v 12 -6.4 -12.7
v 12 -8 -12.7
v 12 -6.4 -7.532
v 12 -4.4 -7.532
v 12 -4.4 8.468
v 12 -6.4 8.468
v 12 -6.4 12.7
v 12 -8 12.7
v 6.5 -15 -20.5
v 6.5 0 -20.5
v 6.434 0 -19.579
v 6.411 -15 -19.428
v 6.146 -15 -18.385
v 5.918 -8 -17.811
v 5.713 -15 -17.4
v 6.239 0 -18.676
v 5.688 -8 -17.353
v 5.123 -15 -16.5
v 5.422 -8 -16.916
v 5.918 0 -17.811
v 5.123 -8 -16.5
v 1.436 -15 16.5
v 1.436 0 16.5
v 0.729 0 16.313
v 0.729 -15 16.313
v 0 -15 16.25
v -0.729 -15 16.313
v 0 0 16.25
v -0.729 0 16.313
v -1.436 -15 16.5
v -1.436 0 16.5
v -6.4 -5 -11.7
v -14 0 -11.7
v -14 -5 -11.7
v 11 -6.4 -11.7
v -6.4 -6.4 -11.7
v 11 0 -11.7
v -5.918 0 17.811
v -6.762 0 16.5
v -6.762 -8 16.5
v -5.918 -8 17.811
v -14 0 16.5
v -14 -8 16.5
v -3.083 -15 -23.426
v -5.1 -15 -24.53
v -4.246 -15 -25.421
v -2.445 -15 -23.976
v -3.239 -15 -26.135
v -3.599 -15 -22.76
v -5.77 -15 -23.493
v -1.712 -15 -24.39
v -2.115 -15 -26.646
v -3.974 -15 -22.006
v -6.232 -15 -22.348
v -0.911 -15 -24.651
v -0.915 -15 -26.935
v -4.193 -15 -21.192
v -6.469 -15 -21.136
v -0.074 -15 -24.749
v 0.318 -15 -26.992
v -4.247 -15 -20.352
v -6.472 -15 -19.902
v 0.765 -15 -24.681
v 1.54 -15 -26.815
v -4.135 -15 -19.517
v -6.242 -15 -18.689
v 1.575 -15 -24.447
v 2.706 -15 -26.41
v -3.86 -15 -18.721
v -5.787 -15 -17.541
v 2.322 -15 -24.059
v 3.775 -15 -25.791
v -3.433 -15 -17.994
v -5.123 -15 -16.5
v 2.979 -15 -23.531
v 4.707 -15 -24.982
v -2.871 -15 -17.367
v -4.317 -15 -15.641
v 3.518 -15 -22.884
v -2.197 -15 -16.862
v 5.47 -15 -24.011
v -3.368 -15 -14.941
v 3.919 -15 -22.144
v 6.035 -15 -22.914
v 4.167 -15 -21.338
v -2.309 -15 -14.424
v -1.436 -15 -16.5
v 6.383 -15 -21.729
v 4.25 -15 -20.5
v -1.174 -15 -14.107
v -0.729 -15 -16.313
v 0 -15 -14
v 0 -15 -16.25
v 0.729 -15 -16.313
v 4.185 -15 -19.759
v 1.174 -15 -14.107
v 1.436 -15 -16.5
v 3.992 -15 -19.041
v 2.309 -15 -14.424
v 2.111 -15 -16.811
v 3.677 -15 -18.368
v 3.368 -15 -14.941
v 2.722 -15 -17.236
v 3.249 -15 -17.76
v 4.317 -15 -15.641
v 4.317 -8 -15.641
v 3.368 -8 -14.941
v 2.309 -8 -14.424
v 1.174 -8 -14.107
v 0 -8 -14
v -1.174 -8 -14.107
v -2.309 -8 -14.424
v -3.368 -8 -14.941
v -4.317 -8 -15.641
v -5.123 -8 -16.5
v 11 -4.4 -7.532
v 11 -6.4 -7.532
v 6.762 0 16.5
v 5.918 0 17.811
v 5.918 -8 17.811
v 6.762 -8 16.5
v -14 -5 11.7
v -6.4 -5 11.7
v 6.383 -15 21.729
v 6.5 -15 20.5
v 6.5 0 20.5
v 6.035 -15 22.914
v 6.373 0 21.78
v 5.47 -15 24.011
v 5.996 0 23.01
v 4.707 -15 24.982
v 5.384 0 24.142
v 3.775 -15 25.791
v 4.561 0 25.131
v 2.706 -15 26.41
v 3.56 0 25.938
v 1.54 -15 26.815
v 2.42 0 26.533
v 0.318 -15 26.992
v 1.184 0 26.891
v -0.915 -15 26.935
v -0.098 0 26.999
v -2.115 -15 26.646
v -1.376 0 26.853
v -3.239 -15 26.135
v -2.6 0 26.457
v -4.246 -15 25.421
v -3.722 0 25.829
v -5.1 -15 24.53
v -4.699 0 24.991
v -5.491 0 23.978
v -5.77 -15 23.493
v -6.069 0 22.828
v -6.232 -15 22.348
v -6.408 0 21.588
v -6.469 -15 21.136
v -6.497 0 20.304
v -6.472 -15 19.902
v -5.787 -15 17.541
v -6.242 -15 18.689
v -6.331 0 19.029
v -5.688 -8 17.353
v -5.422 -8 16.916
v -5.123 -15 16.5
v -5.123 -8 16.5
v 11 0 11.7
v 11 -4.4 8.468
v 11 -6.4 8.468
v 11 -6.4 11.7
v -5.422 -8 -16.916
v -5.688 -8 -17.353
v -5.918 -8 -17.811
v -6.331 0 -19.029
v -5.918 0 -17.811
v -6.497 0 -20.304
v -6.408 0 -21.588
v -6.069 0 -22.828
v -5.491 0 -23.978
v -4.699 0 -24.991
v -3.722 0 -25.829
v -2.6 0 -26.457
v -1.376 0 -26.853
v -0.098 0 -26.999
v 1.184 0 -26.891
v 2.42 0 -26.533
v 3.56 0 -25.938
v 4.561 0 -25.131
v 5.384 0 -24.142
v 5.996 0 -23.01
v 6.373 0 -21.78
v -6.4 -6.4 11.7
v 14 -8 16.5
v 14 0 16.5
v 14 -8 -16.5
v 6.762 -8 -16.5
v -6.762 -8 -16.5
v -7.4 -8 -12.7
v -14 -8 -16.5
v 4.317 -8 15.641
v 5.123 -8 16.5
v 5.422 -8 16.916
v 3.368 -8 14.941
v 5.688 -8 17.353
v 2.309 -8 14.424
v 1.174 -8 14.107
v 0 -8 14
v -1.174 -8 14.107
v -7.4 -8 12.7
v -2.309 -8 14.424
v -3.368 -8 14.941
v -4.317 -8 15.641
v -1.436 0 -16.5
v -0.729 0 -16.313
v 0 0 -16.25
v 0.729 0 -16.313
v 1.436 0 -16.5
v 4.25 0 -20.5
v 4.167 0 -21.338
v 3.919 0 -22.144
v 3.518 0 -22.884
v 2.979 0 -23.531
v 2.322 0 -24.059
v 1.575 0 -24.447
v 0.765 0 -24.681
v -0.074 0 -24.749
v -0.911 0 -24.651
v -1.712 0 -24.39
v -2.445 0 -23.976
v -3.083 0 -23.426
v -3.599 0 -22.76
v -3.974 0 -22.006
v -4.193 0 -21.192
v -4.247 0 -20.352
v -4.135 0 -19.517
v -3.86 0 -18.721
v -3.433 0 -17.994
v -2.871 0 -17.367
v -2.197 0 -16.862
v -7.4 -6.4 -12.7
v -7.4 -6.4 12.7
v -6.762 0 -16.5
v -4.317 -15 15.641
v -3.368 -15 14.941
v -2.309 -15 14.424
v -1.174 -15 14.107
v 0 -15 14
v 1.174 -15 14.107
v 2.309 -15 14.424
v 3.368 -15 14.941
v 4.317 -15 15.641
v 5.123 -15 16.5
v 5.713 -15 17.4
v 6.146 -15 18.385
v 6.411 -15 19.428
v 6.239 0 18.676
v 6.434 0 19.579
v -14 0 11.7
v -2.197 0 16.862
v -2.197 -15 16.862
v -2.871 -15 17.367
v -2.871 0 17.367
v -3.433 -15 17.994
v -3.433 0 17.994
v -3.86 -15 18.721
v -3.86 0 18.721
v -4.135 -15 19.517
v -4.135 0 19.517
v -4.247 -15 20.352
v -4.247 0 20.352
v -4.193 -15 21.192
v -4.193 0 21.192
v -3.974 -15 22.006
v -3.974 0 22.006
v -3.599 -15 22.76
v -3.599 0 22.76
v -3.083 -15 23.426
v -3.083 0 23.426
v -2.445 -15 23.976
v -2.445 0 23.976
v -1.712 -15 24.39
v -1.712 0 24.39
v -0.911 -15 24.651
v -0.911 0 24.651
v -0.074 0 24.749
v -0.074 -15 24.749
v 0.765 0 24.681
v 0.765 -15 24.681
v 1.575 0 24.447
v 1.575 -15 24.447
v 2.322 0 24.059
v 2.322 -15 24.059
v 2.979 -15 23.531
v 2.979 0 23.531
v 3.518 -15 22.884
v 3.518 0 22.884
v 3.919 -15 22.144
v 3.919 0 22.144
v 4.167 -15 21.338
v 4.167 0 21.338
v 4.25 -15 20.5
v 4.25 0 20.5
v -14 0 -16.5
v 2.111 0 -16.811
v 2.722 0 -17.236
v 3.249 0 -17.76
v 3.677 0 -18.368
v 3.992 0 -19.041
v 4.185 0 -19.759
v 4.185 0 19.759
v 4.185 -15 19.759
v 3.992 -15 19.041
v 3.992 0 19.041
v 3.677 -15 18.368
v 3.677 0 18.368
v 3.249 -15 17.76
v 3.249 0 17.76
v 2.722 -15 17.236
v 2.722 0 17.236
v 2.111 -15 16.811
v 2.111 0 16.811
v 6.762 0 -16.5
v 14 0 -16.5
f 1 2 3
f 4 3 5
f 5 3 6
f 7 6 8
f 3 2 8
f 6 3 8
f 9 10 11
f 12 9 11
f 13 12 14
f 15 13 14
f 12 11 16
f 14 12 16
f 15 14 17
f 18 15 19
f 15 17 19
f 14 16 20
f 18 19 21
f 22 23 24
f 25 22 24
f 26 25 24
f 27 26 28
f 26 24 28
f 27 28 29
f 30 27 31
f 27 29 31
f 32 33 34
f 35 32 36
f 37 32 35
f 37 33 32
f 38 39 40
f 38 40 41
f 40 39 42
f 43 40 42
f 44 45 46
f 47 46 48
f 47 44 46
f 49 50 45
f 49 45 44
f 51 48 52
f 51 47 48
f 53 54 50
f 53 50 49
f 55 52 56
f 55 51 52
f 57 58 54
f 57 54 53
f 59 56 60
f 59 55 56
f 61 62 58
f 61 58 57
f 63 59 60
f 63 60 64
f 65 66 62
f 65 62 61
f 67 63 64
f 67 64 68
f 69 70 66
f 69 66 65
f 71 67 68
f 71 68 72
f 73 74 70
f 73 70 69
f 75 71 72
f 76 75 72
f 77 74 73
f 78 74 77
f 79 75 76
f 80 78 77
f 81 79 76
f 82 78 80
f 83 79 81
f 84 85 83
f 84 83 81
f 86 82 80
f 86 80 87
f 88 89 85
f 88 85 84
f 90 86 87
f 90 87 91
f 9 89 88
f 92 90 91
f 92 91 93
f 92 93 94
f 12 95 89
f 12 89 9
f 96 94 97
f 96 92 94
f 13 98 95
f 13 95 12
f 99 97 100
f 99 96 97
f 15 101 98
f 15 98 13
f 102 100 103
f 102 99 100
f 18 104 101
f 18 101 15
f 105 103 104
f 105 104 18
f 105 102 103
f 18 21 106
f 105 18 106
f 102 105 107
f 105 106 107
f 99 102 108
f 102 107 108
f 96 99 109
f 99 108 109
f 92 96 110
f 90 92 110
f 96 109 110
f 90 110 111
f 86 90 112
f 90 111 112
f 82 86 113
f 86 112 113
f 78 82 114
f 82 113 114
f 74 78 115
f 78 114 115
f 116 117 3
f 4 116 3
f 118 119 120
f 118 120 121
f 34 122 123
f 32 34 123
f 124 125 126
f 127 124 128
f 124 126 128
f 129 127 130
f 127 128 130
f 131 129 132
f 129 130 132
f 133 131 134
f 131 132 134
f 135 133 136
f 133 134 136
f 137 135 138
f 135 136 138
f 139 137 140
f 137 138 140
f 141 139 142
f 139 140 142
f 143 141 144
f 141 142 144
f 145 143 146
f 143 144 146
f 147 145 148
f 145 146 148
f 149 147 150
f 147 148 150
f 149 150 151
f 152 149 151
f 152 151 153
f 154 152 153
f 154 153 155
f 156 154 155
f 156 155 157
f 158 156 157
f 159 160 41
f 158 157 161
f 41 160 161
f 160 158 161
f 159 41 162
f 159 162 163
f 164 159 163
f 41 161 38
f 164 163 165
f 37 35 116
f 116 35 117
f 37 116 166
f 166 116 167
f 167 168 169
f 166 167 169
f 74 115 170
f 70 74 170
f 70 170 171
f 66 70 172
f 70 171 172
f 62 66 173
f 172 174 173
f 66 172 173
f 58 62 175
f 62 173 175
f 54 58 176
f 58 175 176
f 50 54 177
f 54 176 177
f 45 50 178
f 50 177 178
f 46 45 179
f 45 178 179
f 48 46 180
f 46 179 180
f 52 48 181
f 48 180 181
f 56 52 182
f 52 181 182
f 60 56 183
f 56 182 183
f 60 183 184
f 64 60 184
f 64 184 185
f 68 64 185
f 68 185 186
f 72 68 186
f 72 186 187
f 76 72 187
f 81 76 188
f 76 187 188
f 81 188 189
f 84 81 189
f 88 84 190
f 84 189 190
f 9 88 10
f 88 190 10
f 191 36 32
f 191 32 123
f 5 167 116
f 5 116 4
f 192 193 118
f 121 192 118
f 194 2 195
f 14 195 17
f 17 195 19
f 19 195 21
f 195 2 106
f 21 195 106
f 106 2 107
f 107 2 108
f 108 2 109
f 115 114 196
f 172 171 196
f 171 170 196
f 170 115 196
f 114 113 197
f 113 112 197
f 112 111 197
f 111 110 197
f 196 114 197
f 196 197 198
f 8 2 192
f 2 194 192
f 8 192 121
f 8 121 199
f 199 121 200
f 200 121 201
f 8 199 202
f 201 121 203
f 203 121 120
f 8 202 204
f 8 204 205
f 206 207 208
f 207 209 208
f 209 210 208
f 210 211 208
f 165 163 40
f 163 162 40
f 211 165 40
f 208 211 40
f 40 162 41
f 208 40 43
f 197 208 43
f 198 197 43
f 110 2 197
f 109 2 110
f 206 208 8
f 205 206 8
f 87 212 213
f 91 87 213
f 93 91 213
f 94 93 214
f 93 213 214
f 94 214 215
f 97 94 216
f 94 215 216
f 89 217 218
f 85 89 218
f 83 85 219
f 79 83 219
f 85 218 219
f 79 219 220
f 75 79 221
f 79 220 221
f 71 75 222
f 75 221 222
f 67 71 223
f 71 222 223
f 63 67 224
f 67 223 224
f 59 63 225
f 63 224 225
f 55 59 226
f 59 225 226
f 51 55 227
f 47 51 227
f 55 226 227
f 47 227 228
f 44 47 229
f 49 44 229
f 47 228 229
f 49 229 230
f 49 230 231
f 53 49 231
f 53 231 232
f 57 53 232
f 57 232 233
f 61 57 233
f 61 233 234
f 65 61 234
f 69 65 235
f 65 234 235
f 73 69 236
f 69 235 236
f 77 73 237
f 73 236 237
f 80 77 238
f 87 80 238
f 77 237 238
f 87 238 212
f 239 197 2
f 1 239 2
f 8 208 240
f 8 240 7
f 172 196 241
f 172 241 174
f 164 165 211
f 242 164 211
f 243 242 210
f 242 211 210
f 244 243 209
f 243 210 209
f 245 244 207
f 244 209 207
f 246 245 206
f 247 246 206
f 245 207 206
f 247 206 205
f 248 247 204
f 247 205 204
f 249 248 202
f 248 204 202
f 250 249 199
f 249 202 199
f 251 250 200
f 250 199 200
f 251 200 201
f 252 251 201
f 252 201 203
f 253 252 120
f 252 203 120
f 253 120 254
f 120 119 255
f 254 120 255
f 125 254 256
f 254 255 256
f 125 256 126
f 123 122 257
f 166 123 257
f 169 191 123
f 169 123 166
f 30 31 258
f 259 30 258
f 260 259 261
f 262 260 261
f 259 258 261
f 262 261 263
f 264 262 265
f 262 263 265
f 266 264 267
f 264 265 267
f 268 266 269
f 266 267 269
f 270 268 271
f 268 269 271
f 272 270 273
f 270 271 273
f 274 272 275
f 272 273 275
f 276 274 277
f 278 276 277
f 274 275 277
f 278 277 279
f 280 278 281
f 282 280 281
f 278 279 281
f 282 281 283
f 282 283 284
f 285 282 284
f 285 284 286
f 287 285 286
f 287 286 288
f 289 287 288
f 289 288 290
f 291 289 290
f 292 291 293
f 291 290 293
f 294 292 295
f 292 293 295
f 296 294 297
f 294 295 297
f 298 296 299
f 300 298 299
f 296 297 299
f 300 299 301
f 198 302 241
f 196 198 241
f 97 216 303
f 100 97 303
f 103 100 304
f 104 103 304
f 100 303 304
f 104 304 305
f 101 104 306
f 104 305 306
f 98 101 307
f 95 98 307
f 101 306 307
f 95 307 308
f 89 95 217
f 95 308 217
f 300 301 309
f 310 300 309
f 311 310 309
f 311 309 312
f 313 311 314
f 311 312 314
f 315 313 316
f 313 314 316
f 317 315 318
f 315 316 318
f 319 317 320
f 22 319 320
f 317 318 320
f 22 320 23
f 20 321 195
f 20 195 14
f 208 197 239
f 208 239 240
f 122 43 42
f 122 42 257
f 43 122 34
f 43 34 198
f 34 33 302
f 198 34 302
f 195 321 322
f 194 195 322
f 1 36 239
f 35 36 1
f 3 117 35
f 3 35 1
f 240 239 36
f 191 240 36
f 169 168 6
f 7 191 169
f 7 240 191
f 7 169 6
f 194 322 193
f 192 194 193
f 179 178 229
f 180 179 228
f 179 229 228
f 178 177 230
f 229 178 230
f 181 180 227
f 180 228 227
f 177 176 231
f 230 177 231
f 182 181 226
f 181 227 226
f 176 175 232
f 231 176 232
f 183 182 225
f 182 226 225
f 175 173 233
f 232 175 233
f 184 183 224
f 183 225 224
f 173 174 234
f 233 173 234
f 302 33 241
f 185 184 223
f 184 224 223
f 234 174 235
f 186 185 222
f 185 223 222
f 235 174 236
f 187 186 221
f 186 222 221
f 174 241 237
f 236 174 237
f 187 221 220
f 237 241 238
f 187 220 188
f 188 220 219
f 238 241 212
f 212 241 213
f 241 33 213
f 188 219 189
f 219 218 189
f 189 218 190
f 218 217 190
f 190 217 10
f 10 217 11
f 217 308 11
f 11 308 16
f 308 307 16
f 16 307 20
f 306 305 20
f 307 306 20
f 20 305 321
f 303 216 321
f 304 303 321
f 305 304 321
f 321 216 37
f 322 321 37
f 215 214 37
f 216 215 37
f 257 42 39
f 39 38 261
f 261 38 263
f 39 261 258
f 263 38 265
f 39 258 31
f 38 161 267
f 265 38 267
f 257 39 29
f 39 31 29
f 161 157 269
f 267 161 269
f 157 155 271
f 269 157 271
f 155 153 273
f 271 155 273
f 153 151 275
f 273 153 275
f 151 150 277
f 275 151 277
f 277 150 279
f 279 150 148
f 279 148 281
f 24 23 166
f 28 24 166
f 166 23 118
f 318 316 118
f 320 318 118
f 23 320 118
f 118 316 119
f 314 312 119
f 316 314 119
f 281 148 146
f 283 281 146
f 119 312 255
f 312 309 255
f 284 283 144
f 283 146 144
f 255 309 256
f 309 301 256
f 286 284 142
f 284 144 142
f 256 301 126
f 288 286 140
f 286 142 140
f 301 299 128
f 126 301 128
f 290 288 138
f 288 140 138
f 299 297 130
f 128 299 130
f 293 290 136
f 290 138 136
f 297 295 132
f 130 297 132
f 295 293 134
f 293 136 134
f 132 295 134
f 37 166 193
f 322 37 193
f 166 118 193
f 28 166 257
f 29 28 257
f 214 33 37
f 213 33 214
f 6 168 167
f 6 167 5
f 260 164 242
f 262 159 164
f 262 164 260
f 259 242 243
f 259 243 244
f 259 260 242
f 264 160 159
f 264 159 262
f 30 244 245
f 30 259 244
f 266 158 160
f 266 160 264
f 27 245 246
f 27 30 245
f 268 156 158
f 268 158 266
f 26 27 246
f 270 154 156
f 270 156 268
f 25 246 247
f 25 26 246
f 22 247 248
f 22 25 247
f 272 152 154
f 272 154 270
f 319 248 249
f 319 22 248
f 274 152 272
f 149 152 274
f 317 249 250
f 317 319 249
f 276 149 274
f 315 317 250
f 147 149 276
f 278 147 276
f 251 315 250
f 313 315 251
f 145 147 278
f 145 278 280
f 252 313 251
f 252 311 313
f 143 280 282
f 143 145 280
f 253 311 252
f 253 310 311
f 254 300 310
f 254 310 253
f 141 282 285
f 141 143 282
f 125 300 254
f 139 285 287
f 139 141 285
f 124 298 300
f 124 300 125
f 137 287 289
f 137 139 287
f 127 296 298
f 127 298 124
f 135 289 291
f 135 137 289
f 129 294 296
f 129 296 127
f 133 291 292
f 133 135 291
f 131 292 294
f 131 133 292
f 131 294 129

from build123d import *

# Parameters (mm, degrees)
F1_DEPTH    = 8
F3_DEPTH    = 15
F4_T1_DEPTH = 8
F5_W        = 19.4
F5_H        = 25.4
F6_DEPTH    = 1.6
F7_W        = 17.4
F7_H        = 23.4
F8_DEPTH    = 25
F9_W        = 17.6963857411
F9_H        = 23.4
F10_DEPTH   = 5
F11_W       = 1
F11_H       = 16
F12_DEPTH   = 2


# Not quite as in the source:
# - a fillet or chamfer that OpenCascade refuses, or shapes differently, is made with other operations: its cross-section is extruded or revolved along the edge and cut away or added
# - a feature of the source that left no trace in its solid (it failed there, or was rolled back) is left out


with BuildPart() as f1:
    # F0 (on Front) → F1 (new body)
    with BuildSketch(Plane.XZ):
        with BuildLine():
            Line((5.123475383, -16.5), (14, -16.5))
            Line((14, -16.5), (14, 16.5))
            Line((14, 16.5), (5.123475383, 16.5))
            ThreePointArc((5.123475383, 16.5), (0, 14), (-5.123475383, 16.5))
            Line((-5.123475383, 16.5), (-14, 16.5))
            Line((-14, 16.5), (-14, -16.5))
            Line((-14, -16.5), (-5.123475383, -16.5))
            ThreePointArc((-5.123475383, -16.5), (0, -14), (5.123475383, -16.5))
        make_face()
    extrude(amount=F1_DEPTH)

    # F0 (on Front) → F3 (join)
    with BuildSketch(Plane.XZ):
        with BuildLine():
            ThreePointArc((6.5, -20.5), (6.1462423475, -18.3848865266), (5.123475383, -16.5))
            Line((5.123475383, -16.5), (1.4361406616, -16.5))
            ThreePointArc((1.4361406616, -16.5), (3.4760680238, -18.0547083826), (4.25, -20.5))
            ThreePointArc((4.25, -20.5), (-2.4452916174, -23.9760680238), (-1.4361406616, -16.5))
            Line((-1.4361406616, -16.5), (-5.123475383, -16.5))
            ThreePointArc((-5.123475383, -16.5), (-2.1151134734, -26.6462423475), (6.5, -20.5))
        make_face()
        with BuildLine():
            Line((1.4361406616, -16.5), (5.123475383, -16.5))
            ThreePointArc((5.123475383, -16.5), (0, -14), (-5.123475383, -16.5))
            Line((-5.123475383, -16.5), (-1.4361406616, -16.5))
            ThreePointArc((-1.4361406616, -16.5), (0, -16.25), (1.4361406616, -16.5))
        make_face()
        with BuildLine():
            ThreePointArc((-5.123475383, 16.5), (0, 14), (5.123475383, 16.5))
            Line((5.123475383, 16.5), (1.4361406616, 16.5))
            ThreePointArc((1.4361406616, 16.5), (0, 16.25), (-1.4361406616, 16.5))
            Line((-1.4361406616, 16.5), (-5.123475383, 16.5))
        make_face()
        with BuildLine():
            Line((1.4361406616, 16.5), (5.123475383, 16.5))
            ThreePointArc((5.123475383, 16.5), (6.1462423475, 18.3848865266), (6.5, 20.5))
            ThreePointArc((6.5, 20.5), (-2.1151134734, 26.6462423475), (-5.123475383, 16.5))
            Line((-5.123475383, 16.5), (-1.4361406616, 16.5))
            ThreePointArc((-1.4361406616, 16.5), (-2.4452916174, 23.9760680238), (4.25, 20.5))
            ThreePointArc((4.25, 20.5), (3.4760680238, 18.0547083826), (1.4361406616, 16.5))
        make_face()
    extrude(amount=F3_DEPTH)

    # F4: chamfer of 1.9 on 4 edges, made by hand

    # F4_s2 → F4_t1 (join)
    with BuildSketch(Plane.XZ):
        with BuildLine():
            Line((-6.8027454264, 16.4361025598), (-5.876418772, 17.87458352))
            Line((-5.876418772, 17.87458352), (-5.8418237692, 17.8903056629))
            ThreePointArc((-5.8418237692, 17.8903056629), (-5.5354543935, 17.1659051218), (-5.0935227577, 16.5233846154))
            Line((-5.0935227577, 16.5233846154), (-5.123475383, 16.462))
            ThreePointArc((-5.123475383, 16.462), (-5.9631104047, 16.462), (-6.8027454264, 16.3981025598))
            Line((-6.8027454264, 16.3981025598), (-6.8027454264, 16.4361025598))
        make_face()
        with BuildLine():
            Line((5.876418772, 17.87458352), (6.8027454264, 16.4361025598))
            Line((6.8027454264, 16.4361025598), (6.8027454264, 16.3981025598))
            ThreePointArc((6.8027454264, 16.3981025598), (5.9631104047, 16.462), (5.123475383, 16.462))
            Line((5.123475383, 16.462), (5.0935227577, 16.5233846154))
            ThreePointArc((5.0935227577, 16.5233846154), (5.5354543935, 17.1659051218), (5.8418237692, 17.8903056629))
            Line((5.8418237692, 17.8903056629), (5.876418772, 17.87458352))
        make_face()
        with BuildLine():
            Line((6.8027454264, -16.4361025598), (5.876418772, -17.87458352))
            Line((5.876418772, -17.87458352), (5.8418237692, -17.8903056629))
            ThreePointArc((5.8418237692, -17.8903056629), (5.5354543935, -17.1659051218), (5.0935227577, -16.5233846154))
            Line((5.0935227577, -16.5233846154), (5.123475383, -16.462))
            ThreePointArc((5.123475383, -16.462), (5.9631104047, -16.462), (6.8027454264, -16.3981025598))
            Line((6.8027454264, -16.3981025598), (6.8027454264, -16.4361025598))
        make_face()
        with BuildLine():
            Line((-6.8027454264, -16.4361025598), (-5.876418772, -17.87458352))
            Line((-5.876418772, -17.87458352), (-5.8418237692, -17.8903056629))
            ThreePointArc((-5.8418237692, -17.8903056629), (-5.5354543935, -17.1659051218), (-5.0935227577, -16.5233846154))
            Line((-5.0935227577, -16.5233846154), (-5.123475383, -16.462))
            ThreePointArc((-5.123475383, -16.462), (-5.9631104047, -16.462), (-6.8027454264, -16.3981025598))
            Line((-6.8027454264, -16.3981025598), (-6.8027454264, -16.4361025598))
        make_face()
    extrude(amount=F4_T1_DEPTH)

    # F5 (on face) → F6 (cut)
    with BuildSketch(Plane.XZ.offset(8)):
        with Locations((2.3, 0)):
            Rectangle(F5_W, F5_H)
    extrude(amount=-F6_DEPTH, mode=Mode.SUBTRACT)

    # F7 (on face) → F8 (cut)
    with BuildSketch(Plane.XZ.offset(6.4)):
        with Locations((2.3, 0)):
            Rectangle(F7_W, F7_H)
    extrude(amount=-F8_DEPTH, mode=Mode.SUBTRACT)

    # F9 (on face) → F10 (cut)
    with BuildSketch(Plane.XZ):
        with Locations((-5.1518071295, 0)):
            Rectangle(F9_W, F9_H)
    extrude(amount=F10_DEPTH, mode=Mode.SUBTRACT)

    # F11 (on face) → F12 (cut)
    with BuildSketch(Plane.XZ.offset(6.4)):
        with Locations((11.5, 0.4684822634)):
            Rectangle(F11_W, F11_H)
    extrude(amount=-F12_DEPTH, mode=Mode.SUBTRACT)


solid = f1.part
